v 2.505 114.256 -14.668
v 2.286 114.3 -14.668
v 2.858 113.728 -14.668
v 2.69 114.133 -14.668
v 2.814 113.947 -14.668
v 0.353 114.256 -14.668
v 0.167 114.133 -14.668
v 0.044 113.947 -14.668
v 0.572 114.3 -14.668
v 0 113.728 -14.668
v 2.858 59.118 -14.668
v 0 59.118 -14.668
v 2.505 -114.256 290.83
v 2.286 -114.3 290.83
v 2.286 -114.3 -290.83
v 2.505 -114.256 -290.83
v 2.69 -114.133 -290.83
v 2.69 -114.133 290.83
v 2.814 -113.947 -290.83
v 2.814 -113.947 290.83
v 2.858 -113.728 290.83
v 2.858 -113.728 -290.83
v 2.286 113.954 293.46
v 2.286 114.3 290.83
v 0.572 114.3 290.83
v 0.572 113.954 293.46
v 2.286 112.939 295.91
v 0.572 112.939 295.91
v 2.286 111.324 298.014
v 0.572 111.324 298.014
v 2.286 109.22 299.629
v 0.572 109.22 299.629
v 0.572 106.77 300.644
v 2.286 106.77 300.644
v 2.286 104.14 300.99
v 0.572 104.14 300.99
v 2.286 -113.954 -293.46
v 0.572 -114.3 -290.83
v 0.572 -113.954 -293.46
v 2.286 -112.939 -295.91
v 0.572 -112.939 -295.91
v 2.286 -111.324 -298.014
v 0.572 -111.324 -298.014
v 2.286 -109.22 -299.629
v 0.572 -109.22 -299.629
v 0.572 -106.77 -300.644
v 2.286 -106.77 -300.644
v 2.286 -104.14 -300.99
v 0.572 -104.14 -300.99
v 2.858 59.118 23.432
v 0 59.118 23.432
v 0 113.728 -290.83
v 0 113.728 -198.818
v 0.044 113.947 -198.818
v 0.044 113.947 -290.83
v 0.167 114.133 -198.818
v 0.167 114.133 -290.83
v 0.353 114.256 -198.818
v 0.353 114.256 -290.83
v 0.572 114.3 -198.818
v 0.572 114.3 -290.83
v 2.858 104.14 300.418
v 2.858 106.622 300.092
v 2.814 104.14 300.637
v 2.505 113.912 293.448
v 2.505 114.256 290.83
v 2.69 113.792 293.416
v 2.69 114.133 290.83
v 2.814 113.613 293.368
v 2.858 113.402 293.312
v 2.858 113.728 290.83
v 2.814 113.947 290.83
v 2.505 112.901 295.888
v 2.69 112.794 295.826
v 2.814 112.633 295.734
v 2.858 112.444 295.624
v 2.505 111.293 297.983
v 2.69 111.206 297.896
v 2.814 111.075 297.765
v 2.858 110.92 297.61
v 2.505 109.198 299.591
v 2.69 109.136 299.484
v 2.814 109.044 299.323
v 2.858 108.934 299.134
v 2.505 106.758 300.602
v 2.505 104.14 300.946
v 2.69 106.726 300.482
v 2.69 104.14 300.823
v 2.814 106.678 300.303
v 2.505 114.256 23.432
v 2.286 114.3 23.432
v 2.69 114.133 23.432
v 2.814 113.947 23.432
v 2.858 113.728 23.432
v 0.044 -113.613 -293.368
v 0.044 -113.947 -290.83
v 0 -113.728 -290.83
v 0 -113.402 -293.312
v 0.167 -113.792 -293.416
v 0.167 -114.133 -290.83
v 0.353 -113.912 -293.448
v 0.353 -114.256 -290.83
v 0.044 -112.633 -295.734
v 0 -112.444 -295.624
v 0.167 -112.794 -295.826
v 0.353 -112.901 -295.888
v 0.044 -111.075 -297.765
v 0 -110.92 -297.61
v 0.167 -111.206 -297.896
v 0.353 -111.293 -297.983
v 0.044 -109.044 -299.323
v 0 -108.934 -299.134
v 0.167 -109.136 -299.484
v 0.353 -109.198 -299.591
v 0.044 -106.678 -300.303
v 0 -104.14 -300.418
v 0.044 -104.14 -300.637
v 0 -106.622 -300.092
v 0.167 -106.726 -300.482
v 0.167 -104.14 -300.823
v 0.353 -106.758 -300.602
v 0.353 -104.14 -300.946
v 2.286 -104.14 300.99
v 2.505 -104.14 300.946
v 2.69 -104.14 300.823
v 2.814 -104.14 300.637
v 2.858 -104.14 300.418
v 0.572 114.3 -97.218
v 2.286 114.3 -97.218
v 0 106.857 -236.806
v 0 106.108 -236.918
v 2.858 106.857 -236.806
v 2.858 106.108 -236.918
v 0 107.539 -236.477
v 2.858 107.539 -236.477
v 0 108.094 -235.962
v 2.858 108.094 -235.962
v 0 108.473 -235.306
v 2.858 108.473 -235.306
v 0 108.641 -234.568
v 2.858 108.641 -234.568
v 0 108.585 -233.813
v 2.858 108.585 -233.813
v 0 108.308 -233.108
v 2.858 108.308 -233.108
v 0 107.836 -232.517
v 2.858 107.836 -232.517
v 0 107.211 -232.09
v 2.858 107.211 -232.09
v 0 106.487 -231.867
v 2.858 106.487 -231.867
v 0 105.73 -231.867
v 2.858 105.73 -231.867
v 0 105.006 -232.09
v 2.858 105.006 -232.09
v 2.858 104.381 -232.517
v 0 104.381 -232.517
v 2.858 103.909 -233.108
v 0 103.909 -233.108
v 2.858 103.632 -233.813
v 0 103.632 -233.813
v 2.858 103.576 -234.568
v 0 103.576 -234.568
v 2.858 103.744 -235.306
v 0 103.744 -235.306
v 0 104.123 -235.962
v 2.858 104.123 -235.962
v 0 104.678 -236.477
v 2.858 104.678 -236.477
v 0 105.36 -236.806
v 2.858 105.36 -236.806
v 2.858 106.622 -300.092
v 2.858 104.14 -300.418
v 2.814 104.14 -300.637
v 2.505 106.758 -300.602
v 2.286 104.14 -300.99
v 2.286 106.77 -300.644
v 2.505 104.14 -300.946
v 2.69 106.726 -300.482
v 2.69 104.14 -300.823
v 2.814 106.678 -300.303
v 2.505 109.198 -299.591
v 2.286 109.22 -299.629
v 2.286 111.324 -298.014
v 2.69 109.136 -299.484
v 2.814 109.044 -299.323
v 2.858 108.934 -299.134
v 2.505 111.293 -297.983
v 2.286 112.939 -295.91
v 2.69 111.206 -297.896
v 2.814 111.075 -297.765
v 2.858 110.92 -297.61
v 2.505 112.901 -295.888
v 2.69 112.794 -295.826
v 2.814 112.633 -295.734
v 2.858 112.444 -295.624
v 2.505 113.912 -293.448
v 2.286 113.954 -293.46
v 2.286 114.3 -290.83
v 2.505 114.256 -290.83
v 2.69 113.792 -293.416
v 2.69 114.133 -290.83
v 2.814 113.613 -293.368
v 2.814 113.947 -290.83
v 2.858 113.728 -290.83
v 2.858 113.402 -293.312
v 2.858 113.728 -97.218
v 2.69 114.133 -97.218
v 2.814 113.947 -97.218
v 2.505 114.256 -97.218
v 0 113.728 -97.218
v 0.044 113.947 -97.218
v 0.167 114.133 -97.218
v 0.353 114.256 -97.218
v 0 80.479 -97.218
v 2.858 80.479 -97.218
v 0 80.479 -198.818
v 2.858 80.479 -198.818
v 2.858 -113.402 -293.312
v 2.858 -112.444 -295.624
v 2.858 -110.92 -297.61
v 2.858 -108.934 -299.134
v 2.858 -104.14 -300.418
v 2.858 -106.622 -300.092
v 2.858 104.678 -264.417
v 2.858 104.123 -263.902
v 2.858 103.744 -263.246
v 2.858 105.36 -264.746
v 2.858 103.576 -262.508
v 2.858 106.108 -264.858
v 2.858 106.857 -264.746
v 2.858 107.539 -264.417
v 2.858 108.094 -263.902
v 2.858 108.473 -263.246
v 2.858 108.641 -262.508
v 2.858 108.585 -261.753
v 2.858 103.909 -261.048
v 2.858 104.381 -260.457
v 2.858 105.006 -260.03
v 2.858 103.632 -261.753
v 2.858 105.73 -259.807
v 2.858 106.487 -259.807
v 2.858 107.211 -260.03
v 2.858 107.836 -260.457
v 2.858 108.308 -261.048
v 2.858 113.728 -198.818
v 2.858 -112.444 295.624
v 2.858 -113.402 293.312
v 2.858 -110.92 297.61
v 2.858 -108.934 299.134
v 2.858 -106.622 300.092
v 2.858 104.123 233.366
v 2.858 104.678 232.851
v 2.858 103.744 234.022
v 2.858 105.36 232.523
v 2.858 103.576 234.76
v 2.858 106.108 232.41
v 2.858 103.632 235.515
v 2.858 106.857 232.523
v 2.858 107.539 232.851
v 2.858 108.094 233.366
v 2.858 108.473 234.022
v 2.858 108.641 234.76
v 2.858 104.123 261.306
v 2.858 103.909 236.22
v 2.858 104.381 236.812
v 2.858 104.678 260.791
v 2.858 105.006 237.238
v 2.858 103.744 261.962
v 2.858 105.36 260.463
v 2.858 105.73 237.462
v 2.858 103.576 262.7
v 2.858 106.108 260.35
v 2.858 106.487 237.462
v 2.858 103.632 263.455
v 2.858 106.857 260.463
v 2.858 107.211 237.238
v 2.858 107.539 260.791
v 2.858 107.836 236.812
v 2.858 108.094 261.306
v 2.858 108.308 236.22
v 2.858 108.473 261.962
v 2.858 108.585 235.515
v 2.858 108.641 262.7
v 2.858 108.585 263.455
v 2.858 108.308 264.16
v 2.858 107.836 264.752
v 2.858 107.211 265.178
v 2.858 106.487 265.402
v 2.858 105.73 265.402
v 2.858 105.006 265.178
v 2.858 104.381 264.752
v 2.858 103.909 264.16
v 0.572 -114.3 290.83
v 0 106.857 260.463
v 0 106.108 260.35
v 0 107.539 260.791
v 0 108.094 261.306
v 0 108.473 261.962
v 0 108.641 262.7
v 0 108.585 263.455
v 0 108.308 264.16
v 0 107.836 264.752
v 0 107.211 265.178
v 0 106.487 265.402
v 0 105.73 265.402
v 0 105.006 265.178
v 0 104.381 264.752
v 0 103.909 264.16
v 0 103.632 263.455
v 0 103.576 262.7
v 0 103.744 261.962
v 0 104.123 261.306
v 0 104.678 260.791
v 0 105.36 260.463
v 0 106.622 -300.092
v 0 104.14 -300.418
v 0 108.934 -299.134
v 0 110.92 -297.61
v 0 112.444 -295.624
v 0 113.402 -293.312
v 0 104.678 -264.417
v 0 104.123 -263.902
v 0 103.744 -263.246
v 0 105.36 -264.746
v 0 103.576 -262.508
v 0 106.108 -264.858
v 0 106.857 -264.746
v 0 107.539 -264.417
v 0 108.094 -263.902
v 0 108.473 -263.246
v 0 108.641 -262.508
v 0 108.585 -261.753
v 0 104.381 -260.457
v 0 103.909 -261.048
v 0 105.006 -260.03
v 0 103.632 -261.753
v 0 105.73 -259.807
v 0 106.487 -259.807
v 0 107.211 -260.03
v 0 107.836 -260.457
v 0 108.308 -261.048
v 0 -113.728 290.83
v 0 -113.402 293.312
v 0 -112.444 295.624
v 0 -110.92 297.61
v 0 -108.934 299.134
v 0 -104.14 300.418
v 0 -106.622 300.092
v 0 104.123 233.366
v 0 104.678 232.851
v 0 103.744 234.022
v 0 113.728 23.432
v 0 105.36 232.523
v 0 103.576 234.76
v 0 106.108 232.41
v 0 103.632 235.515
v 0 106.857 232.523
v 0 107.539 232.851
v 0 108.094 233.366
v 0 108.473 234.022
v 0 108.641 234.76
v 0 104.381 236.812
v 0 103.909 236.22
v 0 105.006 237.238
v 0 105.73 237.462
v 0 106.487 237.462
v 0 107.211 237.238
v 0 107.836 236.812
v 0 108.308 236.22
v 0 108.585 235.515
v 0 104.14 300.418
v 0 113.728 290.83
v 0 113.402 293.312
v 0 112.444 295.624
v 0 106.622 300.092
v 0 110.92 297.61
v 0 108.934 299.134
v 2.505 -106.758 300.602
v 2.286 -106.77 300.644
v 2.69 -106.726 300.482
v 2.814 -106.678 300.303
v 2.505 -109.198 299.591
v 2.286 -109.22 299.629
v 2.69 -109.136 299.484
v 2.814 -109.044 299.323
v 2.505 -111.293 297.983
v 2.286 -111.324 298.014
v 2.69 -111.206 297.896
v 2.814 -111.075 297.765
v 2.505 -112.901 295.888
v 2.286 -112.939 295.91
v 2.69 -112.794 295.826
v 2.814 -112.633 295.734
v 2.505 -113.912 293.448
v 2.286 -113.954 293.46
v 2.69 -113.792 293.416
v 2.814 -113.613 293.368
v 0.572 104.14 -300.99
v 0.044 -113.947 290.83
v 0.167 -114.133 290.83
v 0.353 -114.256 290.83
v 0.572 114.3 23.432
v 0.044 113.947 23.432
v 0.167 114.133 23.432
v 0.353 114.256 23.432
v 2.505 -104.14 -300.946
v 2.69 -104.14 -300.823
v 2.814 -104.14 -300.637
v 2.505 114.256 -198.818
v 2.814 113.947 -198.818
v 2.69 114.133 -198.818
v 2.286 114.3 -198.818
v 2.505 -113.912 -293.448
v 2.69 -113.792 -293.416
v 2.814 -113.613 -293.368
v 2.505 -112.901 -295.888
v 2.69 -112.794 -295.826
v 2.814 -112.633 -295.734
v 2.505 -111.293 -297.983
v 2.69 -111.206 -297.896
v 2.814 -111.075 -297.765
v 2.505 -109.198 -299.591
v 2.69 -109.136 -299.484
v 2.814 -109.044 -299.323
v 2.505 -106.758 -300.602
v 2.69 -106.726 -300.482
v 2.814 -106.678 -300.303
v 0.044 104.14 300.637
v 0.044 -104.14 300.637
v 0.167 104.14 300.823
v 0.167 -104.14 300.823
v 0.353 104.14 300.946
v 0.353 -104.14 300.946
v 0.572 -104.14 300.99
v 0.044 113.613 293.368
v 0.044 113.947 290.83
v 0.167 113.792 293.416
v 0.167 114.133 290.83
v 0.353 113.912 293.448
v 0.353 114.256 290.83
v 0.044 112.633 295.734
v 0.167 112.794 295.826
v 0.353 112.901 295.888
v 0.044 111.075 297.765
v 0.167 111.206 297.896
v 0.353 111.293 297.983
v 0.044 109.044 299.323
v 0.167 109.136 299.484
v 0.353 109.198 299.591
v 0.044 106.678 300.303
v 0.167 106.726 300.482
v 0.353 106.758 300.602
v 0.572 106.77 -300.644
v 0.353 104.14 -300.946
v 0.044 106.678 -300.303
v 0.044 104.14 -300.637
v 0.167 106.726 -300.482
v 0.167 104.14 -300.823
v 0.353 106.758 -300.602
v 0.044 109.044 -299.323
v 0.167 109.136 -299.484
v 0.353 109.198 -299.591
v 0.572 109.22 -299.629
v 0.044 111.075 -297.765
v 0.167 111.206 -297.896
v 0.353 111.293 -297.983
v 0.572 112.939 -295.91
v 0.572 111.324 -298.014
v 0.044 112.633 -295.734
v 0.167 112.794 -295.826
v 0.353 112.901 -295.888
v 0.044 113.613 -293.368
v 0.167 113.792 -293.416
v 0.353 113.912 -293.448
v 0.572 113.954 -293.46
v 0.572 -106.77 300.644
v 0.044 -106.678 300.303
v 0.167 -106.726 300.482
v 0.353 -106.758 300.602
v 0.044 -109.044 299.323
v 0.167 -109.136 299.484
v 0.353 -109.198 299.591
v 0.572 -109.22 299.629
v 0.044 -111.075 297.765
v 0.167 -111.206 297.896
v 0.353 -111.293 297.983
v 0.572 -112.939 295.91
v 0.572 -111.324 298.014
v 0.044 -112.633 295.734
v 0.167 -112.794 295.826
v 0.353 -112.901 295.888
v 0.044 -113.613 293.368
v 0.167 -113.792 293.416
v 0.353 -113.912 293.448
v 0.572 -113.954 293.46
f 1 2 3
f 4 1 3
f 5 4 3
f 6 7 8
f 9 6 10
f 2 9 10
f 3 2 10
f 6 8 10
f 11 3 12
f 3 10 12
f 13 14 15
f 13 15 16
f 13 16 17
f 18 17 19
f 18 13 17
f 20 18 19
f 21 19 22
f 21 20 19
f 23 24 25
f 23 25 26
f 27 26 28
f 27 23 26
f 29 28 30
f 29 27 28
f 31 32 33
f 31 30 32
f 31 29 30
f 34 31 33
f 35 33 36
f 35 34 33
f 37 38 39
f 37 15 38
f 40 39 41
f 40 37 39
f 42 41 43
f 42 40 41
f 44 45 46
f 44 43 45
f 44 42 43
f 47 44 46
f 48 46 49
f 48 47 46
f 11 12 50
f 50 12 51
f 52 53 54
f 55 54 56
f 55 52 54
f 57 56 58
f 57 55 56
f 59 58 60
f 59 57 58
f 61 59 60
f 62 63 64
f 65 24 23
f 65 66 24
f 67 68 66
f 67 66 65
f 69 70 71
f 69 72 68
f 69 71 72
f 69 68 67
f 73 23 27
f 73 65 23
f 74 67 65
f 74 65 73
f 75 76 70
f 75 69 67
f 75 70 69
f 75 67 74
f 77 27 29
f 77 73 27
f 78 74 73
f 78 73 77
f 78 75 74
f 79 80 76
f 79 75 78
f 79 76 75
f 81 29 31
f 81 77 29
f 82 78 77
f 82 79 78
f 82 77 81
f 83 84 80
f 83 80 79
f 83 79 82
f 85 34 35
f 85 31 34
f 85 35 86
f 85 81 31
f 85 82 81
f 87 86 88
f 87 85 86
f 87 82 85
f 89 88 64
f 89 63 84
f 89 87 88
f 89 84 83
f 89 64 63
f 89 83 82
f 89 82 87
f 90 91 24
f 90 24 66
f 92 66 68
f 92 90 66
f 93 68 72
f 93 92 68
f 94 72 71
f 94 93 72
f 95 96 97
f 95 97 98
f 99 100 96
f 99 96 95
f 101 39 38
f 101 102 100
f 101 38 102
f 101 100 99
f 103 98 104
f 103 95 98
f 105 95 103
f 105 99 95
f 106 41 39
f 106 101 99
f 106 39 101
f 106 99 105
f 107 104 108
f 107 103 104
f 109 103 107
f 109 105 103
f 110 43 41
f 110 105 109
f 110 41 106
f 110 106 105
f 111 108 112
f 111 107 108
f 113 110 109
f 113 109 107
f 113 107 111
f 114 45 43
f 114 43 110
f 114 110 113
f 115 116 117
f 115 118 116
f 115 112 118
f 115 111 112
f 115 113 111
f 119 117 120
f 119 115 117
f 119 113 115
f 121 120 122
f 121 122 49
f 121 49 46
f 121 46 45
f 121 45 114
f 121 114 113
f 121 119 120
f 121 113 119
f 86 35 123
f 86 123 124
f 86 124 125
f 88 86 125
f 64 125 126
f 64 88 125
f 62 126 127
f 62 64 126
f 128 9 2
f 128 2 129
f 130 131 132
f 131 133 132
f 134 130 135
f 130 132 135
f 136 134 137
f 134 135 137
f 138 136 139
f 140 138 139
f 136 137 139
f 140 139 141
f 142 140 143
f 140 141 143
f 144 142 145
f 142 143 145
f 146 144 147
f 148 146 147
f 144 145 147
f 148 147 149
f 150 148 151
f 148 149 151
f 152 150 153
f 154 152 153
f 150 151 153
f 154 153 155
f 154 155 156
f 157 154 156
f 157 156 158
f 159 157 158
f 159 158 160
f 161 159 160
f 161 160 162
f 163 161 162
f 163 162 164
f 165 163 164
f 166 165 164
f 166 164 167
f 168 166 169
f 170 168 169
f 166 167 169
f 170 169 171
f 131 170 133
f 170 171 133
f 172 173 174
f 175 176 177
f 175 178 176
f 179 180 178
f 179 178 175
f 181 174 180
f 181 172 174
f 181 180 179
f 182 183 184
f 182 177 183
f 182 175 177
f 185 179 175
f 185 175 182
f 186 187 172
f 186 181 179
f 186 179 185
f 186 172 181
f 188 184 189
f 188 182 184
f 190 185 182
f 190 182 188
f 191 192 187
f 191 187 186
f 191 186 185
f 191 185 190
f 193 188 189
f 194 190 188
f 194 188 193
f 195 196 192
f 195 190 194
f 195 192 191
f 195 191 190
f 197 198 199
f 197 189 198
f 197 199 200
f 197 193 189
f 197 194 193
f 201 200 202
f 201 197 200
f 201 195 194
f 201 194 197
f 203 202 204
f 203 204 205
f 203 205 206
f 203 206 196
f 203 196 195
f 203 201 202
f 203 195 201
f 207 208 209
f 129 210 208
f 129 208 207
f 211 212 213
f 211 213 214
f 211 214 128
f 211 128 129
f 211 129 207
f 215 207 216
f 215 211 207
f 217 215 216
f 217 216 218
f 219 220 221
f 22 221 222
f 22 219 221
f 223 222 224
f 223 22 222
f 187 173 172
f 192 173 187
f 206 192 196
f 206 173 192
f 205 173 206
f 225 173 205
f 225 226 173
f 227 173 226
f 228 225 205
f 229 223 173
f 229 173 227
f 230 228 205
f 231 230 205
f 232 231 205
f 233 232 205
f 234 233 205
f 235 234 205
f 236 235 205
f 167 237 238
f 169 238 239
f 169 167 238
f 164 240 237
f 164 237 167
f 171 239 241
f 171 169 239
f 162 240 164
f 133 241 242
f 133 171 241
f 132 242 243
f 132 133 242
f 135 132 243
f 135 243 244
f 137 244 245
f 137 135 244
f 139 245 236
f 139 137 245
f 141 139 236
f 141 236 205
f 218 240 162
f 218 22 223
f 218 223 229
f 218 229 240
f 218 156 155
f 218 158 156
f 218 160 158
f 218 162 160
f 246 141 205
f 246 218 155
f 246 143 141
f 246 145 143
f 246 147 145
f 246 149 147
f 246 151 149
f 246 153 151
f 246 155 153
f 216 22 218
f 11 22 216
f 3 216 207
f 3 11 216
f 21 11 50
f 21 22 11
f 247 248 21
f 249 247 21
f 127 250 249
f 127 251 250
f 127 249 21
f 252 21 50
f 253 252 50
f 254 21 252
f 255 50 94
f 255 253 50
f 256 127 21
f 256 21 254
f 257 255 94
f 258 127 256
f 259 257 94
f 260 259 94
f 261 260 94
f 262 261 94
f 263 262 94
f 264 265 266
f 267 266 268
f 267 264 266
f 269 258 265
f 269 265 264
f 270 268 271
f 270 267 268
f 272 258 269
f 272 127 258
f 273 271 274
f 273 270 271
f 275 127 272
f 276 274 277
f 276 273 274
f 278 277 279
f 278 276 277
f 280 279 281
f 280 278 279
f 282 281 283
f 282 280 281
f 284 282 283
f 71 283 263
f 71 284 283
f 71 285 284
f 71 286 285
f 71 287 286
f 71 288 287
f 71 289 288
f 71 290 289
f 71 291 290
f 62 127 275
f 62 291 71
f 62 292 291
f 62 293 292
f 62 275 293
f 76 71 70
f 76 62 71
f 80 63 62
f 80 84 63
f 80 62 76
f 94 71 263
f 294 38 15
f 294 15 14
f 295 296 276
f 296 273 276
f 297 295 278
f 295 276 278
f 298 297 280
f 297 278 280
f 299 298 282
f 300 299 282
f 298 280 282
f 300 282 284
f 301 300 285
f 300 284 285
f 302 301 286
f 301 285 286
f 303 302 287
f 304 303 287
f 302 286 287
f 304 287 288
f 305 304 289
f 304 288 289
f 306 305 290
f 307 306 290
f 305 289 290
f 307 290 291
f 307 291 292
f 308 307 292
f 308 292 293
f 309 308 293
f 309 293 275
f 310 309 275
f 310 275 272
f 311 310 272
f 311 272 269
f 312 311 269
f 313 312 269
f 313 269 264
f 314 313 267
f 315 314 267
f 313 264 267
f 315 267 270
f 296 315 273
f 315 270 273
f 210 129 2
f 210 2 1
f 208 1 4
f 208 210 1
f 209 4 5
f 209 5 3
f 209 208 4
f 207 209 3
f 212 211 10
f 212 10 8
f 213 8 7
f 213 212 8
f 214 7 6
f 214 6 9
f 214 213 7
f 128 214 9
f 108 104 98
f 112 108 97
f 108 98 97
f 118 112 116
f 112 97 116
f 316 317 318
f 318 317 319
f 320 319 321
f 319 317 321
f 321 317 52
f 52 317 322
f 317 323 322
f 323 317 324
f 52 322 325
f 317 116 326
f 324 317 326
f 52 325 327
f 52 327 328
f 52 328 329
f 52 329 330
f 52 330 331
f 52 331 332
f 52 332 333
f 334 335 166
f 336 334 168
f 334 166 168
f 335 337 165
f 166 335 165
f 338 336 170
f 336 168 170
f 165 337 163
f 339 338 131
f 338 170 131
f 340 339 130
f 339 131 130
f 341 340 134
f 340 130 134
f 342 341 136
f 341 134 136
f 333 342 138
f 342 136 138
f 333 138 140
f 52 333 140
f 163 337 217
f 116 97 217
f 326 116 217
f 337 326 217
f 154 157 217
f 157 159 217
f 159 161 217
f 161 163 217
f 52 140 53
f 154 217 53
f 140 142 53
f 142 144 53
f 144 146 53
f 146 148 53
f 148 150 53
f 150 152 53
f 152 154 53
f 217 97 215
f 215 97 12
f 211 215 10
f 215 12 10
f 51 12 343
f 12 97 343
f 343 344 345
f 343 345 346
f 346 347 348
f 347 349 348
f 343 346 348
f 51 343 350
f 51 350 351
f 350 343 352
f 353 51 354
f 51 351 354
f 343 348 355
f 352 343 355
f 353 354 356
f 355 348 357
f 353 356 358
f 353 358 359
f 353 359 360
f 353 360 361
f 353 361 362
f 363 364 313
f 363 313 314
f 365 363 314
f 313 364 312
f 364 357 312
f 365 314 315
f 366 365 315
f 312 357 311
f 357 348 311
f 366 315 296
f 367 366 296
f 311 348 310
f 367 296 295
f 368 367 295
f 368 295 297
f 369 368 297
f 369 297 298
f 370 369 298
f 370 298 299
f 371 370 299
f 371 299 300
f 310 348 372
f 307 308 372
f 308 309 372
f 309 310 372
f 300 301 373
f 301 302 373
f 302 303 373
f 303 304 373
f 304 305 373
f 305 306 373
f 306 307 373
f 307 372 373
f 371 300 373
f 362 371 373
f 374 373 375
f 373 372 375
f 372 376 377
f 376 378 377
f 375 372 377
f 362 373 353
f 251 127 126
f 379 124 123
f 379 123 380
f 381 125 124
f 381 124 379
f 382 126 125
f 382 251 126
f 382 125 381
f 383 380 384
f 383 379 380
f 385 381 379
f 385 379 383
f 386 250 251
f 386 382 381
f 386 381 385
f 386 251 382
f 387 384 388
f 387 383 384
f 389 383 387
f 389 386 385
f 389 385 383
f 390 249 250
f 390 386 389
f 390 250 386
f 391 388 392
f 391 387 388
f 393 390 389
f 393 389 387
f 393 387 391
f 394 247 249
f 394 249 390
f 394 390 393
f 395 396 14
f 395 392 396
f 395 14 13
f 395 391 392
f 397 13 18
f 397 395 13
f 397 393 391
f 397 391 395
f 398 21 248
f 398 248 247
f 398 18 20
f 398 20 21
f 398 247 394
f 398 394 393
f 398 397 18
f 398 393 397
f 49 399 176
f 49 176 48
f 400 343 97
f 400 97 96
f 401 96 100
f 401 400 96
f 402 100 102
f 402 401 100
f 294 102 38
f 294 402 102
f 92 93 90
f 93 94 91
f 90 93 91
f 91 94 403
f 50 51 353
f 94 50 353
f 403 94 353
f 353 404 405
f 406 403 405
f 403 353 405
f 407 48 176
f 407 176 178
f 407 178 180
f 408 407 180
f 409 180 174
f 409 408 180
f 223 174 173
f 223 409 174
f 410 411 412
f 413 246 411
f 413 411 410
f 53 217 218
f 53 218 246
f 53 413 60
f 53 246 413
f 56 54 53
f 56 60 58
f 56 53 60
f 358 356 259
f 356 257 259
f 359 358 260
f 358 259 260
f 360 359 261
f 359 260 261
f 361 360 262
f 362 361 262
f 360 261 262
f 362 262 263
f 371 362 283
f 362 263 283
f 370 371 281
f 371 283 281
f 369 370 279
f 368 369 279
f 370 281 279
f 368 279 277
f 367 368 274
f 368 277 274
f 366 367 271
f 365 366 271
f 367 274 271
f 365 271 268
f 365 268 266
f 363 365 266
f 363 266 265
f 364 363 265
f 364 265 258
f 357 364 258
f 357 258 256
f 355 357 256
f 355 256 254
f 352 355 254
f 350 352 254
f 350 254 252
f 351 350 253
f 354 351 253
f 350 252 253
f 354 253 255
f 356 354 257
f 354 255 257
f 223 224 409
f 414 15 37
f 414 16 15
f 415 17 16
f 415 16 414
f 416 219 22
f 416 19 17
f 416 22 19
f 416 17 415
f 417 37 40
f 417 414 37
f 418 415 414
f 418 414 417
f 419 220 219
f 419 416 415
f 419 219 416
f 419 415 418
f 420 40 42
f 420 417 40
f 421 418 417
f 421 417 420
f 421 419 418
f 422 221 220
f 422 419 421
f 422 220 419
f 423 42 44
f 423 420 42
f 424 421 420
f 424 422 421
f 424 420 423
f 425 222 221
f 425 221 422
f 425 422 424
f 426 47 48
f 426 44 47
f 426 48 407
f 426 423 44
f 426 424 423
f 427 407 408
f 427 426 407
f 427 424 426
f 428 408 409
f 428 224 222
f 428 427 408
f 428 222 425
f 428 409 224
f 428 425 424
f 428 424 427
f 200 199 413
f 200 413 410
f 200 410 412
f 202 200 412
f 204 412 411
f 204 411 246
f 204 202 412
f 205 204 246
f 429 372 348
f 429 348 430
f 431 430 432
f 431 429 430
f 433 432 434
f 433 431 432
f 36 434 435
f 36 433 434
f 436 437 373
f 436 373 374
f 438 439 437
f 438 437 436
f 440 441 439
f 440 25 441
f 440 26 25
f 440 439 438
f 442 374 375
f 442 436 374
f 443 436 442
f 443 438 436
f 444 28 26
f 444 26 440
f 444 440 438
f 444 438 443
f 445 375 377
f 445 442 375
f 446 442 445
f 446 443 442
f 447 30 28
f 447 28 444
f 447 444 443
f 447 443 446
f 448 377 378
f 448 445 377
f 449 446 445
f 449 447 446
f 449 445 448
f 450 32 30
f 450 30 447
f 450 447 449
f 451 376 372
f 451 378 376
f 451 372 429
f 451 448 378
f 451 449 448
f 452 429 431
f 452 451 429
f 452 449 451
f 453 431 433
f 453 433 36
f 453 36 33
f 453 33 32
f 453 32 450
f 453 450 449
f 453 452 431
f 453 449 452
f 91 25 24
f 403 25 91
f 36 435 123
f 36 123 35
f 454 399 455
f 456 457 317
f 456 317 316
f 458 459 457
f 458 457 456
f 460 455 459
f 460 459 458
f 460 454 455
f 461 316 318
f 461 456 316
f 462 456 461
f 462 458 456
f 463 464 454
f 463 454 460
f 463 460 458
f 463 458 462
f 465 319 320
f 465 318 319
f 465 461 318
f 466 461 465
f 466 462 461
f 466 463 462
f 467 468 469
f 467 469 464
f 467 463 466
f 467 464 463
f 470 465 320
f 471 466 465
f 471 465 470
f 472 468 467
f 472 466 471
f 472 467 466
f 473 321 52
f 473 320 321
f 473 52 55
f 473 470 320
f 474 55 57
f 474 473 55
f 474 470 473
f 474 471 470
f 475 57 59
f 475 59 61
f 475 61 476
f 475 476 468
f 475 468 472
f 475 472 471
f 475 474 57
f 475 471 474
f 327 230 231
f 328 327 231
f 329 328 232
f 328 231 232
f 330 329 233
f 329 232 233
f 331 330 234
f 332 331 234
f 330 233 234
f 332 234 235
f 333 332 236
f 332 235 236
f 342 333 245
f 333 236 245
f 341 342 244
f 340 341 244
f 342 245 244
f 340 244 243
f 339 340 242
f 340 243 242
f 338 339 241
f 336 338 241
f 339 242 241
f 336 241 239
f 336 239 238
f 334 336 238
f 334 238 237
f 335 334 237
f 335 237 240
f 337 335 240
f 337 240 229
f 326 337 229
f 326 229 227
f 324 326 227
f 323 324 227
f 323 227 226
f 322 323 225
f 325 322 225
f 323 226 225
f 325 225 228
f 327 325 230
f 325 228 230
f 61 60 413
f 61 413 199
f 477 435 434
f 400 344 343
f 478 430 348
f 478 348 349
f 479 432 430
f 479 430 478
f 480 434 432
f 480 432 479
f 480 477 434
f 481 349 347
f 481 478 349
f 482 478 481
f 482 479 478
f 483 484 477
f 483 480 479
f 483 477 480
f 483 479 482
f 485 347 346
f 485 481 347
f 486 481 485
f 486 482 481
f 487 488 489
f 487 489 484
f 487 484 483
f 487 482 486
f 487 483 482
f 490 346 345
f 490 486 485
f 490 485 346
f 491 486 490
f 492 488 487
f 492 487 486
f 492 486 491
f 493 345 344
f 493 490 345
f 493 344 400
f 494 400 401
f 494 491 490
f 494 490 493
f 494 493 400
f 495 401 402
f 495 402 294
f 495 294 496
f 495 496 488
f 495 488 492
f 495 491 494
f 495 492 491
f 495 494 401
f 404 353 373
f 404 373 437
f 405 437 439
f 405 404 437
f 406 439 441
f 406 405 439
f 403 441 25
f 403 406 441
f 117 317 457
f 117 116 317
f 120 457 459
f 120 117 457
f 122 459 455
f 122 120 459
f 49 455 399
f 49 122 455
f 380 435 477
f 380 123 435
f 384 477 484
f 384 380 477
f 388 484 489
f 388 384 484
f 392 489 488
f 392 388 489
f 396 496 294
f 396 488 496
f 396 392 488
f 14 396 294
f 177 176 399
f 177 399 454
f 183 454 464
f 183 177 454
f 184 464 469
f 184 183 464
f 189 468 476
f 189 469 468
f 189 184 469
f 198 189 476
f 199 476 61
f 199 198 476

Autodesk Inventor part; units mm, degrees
ref_plane "YZ Plane" through (0, 0, 0) normal (1, 0, 0) x (0, 1, 0)
ref_plane "XZ Plane" through (0, 0, 0) normal (0, 1, 0) x (-1, 0, 0)
ref_plane "XY Plane" through (0, 0, 0) normal (0, 0, 1) x (1, 0, 0)
sketch "Sketch1" plane through (0, 0, 0) normal (1, 0, 0) x (0, 1, 0)
  line L0 (-114.3, 300.99) -> (114.3, 300.99)
  line L1 (114.3, 300.99) -> (114.3, -300.99)
  line L2 (114.3, -300.99) -> (-114.3, -300.99)
  line L3 (-114.3, -300.99) -> (-114.3, 300.99)
  line L4 (-114.3, 300.99) -> (114.3, -300.99) construction
  line L5 (114.3, 300.99) -> (-114.3, -300.99) construction
  point P0 (0, 0)
  dimension "d3" = 228.6
  dimension "d4" = 601.98
extrude "Extrusion2" add sketch "Sketch1" along normal blind 2.8575
fillet "Fillet1" radius 10.16 4 edges at (1.4287, -114.3, -300.99) (1.4287, 114.3, -300.99) (1.4287, -114.3, 300.99) (1.4287, 114.3, 300.99)
fillet "Fillet2" radius 0.5715 16 edges at (2.8575, 111.3242, 298.0142) (2.8575, 0, 300.99) (2.8575, -111.3242, 298.0142) (2.8575, -114.3, 0) (2.8575, -111.3242, -298.0142) (2.8575, 0, -300.99) (2.8575, 111.3242, -298.0142) (2.8575, 114.3, 0) (0, 111.3242, -298.0142) (0, 0, -300.99) (0, -111.3242, -298.0142) (0, -114.3, 0) (0, -111.3242, 298.0142) (0, 0, 300.99) (0, 111.3242, 298.0142) (0, 114.3, 0)
sketch "Sketch3" plane through (0, 0, 0) normal (-1, 0, 0) x (0, 0, 1)
  line L0 (300.4185, 104.14) -> (300.4185, -104.14) projected
  line L1 (290.83, -113.7285) -> (-290.83, -113.7285) projected
  line L2 (-290.83, 113.7285) -> (290.83, 113.7285) projected
  line L3 (-300.4185, -104.14) -> (-300.4185, 104.14) projected
  line L4 (290.83, 113.7285) -> (-290.83, 113.7285) projected
  line L5 (-97.2185, 125.0999) -> (-97.2185, 80.4789)
  line L6 (-97.2185, 80.4789) -> (-198.8185, 80.4789)
  line L7 (-198.8185, 80.4789) -> (-198.8185, 125.0999)
  line L8 (-97.2185, 125.0999) -> (-198.8185, 125.0999)
  line L9 (23.4315, 116.2685) -> (-14.6685, 116.2685)
  line L10 (-14.6685, 116.2685) -> (-14.6685, 59.1185)
  line L11 (-14.6685, 59.1185) -> (23.4315, 59.1185)
  line L12 (23.4315, 59.1185) -> (23.4315, 116.2685)
  dimension "d48" = 101.6
  dimension "d49" = 101.6
  dimension "d50" = 0
  dimension "d63" = 11.3714
  dimension "d64" = 33.2496
  dimension "d65" = 38.1
  dimension "d66" = 82.55
  dimension "d67" = 57.15
  dimension "d68" = 2.54
extrude "Extrusion3" cut sketch "Sketch3" against normal blind 5.08
sketch "Sketch4" plane through (2.8575, 0, 0) normal (1, 0, 0) x (0, 0, -1)
  circle A0 centre (234.3785, 106.1085) radius 2.54
  circle A1 centre (262.3185, 106.1085) radius 2.54
  line L0 (-290.83, 113.7285) -> (290.83, 113.7285) projected
  line L1 (300.4185, 104.14) -> (300.4185, -104.14) projected
  circle A2 centre (-262.89, 106.1085) radius 2.54
  circle A3 centre (-234.95, 106.1085) radius 2.54
  line L2 (-300.99, 104.14) -> (-300.99, -104.14) projected
  point P0 (0, 0)
  point P1 (198.8185, 113.7285)
  dimension "d52" = 5.08
  dimension "d53" = 7.62
  dimension "d54" = 27.94
  dimension "d55" = 38.1
  dimension "d58" = 27.94
  dimension "d60" = 38.1
extrude "Extrusion5" cut sketch "Sketch4" against normal up to next
equation "\"d58\" = d54"
equation "\"d60\" = d55"
equation "\"d61\" = d54"
properties part number "SideFlap2"
